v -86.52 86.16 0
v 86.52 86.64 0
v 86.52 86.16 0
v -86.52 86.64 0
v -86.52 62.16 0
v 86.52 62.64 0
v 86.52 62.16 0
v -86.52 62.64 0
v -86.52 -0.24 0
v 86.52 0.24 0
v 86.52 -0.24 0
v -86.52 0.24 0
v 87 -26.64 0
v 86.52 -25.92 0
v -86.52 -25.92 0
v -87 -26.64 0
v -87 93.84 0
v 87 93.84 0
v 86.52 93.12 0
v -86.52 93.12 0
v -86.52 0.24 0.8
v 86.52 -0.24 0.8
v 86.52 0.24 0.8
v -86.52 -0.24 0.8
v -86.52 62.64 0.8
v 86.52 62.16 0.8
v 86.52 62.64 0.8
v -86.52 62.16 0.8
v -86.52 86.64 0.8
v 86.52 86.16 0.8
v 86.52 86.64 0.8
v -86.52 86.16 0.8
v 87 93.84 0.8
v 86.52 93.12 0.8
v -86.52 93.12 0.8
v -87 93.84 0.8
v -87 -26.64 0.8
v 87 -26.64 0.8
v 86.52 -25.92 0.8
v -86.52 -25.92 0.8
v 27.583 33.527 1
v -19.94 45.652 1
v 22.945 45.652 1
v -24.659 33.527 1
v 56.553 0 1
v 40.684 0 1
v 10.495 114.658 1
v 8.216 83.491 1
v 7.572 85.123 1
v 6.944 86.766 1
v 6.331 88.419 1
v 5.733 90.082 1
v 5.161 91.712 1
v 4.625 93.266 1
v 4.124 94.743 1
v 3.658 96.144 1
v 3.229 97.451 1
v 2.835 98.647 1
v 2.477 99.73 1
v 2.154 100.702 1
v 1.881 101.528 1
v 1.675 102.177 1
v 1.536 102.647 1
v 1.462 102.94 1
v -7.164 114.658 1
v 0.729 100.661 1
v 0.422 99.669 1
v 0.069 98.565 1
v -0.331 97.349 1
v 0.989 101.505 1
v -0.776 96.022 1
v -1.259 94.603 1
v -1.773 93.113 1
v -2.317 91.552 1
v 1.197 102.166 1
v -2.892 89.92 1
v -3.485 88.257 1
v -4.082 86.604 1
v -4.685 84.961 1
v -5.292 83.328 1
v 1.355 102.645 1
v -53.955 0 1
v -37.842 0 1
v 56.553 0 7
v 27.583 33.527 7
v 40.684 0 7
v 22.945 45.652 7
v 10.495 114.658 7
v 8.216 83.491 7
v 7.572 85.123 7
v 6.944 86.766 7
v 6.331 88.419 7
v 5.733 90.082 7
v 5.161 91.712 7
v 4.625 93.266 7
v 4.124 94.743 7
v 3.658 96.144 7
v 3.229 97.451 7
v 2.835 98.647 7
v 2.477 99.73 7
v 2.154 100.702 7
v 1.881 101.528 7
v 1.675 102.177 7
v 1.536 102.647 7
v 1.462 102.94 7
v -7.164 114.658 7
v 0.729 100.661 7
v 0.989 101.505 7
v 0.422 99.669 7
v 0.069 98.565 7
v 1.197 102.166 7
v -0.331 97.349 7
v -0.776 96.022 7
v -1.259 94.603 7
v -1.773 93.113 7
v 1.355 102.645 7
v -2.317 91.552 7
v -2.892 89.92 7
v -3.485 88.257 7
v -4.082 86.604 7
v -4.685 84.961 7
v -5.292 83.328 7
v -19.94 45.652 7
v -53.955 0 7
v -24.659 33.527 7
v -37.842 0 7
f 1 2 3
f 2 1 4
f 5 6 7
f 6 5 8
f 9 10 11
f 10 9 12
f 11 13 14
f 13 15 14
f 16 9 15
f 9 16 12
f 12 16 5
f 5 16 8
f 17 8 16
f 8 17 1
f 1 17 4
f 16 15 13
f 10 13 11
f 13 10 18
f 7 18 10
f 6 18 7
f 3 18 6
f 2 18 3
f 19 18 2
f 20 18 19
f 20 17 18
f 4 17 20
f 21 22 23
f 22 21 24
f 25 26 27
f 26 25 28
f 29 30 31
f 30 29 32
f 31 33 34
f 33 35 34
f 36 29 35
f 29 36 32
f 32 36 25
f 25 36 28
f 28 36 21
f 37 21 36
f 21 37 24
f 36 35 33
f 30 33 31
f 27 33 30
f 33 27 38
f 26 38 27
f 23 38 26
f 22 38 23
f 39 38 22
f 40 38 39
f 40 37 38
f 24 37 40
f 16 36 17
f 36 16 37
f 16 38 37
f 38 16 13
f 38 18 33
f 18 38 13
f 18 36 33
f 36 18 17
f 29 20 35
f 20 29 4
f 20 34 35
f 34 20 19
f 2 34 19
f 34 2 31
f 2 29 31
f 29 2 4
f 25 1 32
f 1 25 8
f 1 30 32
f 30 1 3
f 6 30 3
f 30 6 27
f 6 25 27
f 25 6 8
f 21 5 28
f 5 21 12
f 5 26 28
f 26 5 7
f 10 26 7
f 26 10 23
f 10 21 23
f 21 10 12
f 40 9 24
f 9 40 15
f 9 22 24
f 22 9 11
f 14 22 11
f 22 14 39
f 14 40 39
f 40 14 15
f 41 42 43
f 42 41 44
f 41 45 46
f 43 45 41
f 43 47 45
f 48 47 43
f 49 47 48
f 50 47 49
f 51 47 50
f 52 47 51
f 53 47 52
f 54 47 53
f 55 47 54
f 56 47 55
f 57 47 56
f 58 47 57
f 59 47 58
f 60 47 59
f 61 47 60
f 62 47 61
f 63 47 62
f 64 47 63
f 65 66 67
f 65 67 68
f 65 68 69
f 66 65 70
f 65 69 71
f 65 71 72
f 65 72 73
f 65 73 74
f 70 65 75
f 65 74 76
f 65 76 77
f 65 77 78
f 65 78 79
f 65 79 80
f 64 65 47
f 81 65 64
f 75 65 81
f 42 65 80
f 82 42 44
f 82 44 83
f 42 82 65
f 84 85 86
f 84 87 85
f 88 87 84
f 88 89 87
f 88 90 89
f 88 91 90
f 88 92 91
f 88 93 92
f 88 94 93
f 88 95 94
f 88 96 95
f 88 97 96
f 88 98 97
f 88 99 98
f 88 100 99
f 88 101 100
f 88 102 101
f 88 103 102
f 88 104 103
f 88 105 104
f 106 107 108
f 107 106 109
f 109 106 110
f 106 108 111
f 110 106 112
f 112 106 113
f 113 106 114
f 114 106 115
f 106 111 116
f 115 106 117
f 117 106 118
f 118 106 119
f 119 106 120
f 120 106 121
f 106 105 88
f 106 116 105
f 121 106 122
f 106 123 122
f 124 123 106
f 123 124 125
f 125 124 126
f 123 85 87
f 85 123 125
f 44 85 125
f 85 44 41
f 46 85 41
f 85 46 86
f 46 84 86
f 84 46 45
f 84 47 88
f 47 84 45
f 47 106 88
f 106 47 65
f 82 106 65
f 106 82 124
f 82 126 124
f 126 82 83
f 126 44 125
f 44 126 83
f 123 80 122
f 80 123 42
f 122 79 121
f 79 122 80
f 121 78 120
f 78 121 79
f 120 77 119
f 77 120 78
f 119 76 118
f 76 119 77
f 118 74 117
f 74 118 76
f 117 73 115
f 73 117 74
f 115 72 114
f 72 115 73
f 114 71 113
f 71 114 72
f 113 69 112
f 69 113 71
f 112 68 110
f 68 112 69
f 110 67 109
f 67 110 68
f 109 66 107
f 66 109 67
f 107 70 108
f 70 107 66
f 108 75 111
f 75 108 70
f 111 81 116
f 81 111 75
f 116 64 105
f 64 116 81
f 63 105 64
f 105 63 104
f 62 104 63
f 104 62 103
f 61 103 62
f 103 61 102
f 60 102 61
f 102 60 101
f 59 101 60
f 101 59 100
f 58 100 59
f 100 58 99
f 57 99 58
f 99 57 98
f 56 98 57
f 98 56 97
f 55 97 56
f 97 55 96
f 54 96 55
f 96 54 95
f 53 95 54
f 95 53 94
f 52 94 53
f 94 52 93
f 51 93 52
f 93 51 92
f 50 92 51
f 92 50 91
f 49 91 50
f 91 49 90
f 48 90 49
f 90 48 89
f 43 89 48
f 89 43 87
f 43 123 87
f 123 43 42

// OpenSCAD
// file: geometry/contact_sheet.scad
//////////////////////////////////////////////////////////////////////
// LibFile: contact_sheet.scad
// Project: Glyph Dossier
// FileGroup: Diagnostic Rendering
// FileSummary: Representative-set preview grid.
//////////////////////////////////////////////////////////////////////

module _contact_cell_frame(cell_size, depth) {
    frame_thickness = 0.8;

    color([0.35, 0.40, 0.48, 0.35])
        linear_extrude(height = depth)
            difference() {
                square(
                    [cell_size, cell_size],
                    center = true
                );
                square(
                    [
                        cell_size - 2 * frame_thickness,
                        cell_size - 2 * frame_thickness
                    ],
                    center = true
                );
            }
}

module glyph_contact_sheet(
    ids,
    records,
    source_kind,
    font_name,
    columns,
    cell_size,
    glyph_size,
    depth
) {
    rows = ceil(len(ids) / columns);

    for (index = [0 : len(ids) - 1]) {
        row = floor(index / columns);
        column = index % columns;
        x = (column - (columns - 1) / 2) * cell_size;
        y = ((rows - 1) / 2 - row) * cell_size;
        dossier = named_record(
            records,
            ids[index],
            "contact-sheet dossier"
        );

        translate([x, y, 0]) {
            _contact_cell_frame(cell_size, 0.6);

            color([0.88, 0.68, 0.24])
                translate([0, -glyph_size * 0.25, 0.8])
                    glyph_profile_3d(
                        dossier,
                        source_kind,
                        font_name,
                        glyph_size,
                        depth
                    );
        }
    }
}
// file: geometry/dossier_scene.scad
//////////////////////////////////////////////////////////////////////
// LibFile: dossier_scene.scad
// Project: Glyph Dossier
// FileGroup: Diagnostic Rendering
// FileSummary: Individual profile and guide-frame render modes.
//////////////////////////////////////////////////////////////////////

module render_glyph_dossier(
    dossier,
    render_mode,
    source_kind,
    font_name,
    nominal_size,
    extrusion_depth,
    guide_depth,
    show_guides,
    show_frame,
    x_height_ratio,
    cap_height_ratio,
    ascender_ratio,
    descender_ratio
) {
    if (render_mode == "profile_2d") {
        glyph_source_2d(
            dossier,
            source_kind,
            font_name,
            nominal_size
        );
    } else if (render_mode == "profile_3d") {
        glyph_profile_3d(
            dossier,
            source_kind,
            font_name,
            nominal_size,
            extrusion_depth
        );
    } else if (render_mode == "dossier") {
        if (show_guides)
            color([0.45, 0.55, 0.70, 0.45])
                nominal_guides_3d(
                    nominal_size,
                    guide_depth,
                    x_height_ratio,
                    cap_height_ratio,
                    ascender_ratio,
                    descender_ratio,
                    show_frame
                );

        color([0.88, 0.68, 0.24])
            translate([0, 0, guide_depth + 0.2])
                glyph_profile_3d(
                    dossier,
                    source_kind,
                    font_name,
                    nominal_size,
                    extrusion_depth
                );
    }
}
// file: geometry/analysis_guides.scad
//////////////////////////////////////////////////////////////////////
// LibFile: analysis_guides.scad
// Project: Glyph Dossier
// FileGroup: Diagnostic Geometry
// FileSummary: Nominal, non-measured baseline and height guides.
//////////////////////////////////////////////////////////////////////

module _guide_line_2d(width, thickness, y) {
    translate([0, y])
        square([width, thickness], center = true);
}

module nominal_guides_2d(
    nominal_size,
    x_height_ratio,
    cap_height_ratio,
    ascender_ratio,
    descender_ratio,
    show_frame = true
) {
    guide_width = nominal_size * 1.45;
    thickness = max(0.35, nominal_size * 0.004);
    lower = -nominal_size * descender_ratio;
    upper = nominal_size * ascender_ratio;

    union() {
        _guide_line_2d(guide_width, thickness, 0);
        _guide_line_2d(
            guide_width,
            thickness,
            nominal_size * x_height_ratio
        );
        _guide_line_2d(
            guide_width,
            thickness,
            nominal_size * cap_height_ratio
        );
        _guide_line_2d(guide_width, thickness, upper);
        _guide_line_2d(guide_width, thickness, lower);

        if (show_frame)
            difference() {
                translate([0, (upper + lower) / 2])
                    square(
                        [guide_width, upper - lower],
                        center = true
                    );
                translate([0, (upper + lower) / 2])
                    square(
                        [
                            guide_width - 2 * thickness,
                            upper - lower - 2 * thickness
                        ],
                        center = true
                    );
            }
    }
}

module nominal_guides_3d(
    nominal_size,
    depth,
    x_height_ratio,
    cap_height_ratio,
    ascender_ratio,
    descender_ratio,
    show_frame = true
) {
    linear_extrude(height = depth)
        nominal_guides_2d(
            nominal_size,
            x_height_ratio,
            cap_height_ratio,
            ascender_ratio,
            descender_ratio,
            show_frame
        );
}
// file: geometry/glyph_profile.scad
//////////////////////////////////////////////////////////////////////
// LibFile: glyph_profile.scad
// Project: Glyph Dossier
// FileGroup: Source Adapter
// FileSummary: Font-backed text, glyph, source, and extrusion adapters.
//////////////////////////////////////////////////////////////////////

module font_text_2d(
    value,
    font_name,
    nominal_size,
    halign_value = "center",
    valign_value = "baseline"
) {
    if (font_name == "")
        text(
            text = value,
            size = nominal_size,
            halign = halign_value,
            valign = valign_value
        );
    else
        text(
            text = value,
            size = nominal_size,
            font = font_name,
            halign = halign_value,
            valign = valign_value
        );
}

module font_glyph_2d(glyph, font_name, nominal_size) {
    font_text_2d(
        glyph,
        font_name,
        nominal_size,
        "center",
        "baseline"
    );
}

module glyph_source_2d(
    dossier,
    source_kind,
    font_name,
    nominal_size
) {
    assert(
        source_kind == "font",
        str("Source adapter does not implement kind: ", source_kind)
    );

    font_glyph_2d(
        dossier[GD_GLYPH],
        font_name,
        nominal_size
    );
}

module glyph_profile_3d(
    dossier,
    source_kind,
    font_name,
    nominal_size,
    depth
) {
    linear_extrude(height = depth)
        glyph_source_2d(
            dossier,
            source_kind,
            font_name,
            nominal_size
        );
}

module glyph_source_record_2d(
    dossier,
    source,
    nominal_size
) {
    glyph_source_2d(
        dossier,
        source[FS_KIND],
        source[FS_FONT_NAME],
        nominal_size
    );
}

module glyph_source_record_3d(
    dossier,
    source,
    nominal_size,
    depth
) {
    glyph_profile_3d(
        dossier,
        source[FS_KIND],
        source[FS_FONT_NAME],
        nominal_size,
        depth
    );
}
// file: lib/reporting.scad
//////////////////////////////////////////////////////////////////////
// LibFile: reporting.scad
// Project: Glyph Dossier
// FileGroup: Console Reporting
// FileSummary: Reports project, source, dossier, and study-set data.
//////////////////////////////////////////////////////////////////////

module report_project(project, report_level = "full") {
    echo("GLYPH_DOSSIER_PROJECT", project[PR_NAME]);
    echo("GLYPH_DOSSIER_KIND", project[PR_KIND]);
    echo("GLYPH_DOSSIER_EDITION", project[PR_EDITION]);
    echo("GLYPH_DOSSIER_BASELINE", project[PR_BASELINE]);

    if (report_level == "full") {
        echo("GLYPH_DOSSIER_SCOPE", project[PR_SCOPE]);
        echo("GLYPH_DOSSIER_STATUS", project[PR_STATUS]);
    }
}

module report_catalog_notice(project) {
    echo("GLYPH_DOSSIER_CATALOG", project[PR_STATUS]);
}

module report_source(
    source_kind,
    font_name,
    font_license,
    font_source_url,
    font_revision
) {
    echo("GLYPH_SOURCE_KIND", source_kind);
    echo(
        "GLYPH_FONT_NAME",
        font_name == "" ? "OpenSCAD default font" : font_name
    );
    echo("GLYPH_FONT_LICENSE", font_license);
    echo("GLYPH_FONT_SOURCE_URL", font_source_url);
    echo("GLYPH_FONT_REVISION", font_revision);
}

module report_glyph_dossier(dossier, report_level = "full") {
    echo("DOSSIER_ID", dossier[GD_ID]);
    echo("DOSSIER_GLYPH", dossier[GD_GLYPH]);
    echo("DOSSIER_GROUP", dossier[GD_GROUP]);
    echo("DOSSIER_ARCHETYPE", dossier[GD_ARCHETYPE]);
    echo("DOSSIER_COMPONENT_RANGE", [
        dossier[GD_COMPONENTS_MIN],
        dossier[GD_COMPONENTS_MAX]
    ]);
    echo("DOSSIER_COUNTER_RANGE", [
        dossier[GD_COUNTERS_MIN],
        dossier[GD_COUNTERS_MAX]
    ]);
    echo("DOSSIER_VERTICAL_CLASS", dossier[GD_VERTICAL_CLASS]);
    echo("DOSSIER_PRIORITY", dossier[GD_PRIORITY]);

    if (report_level == "full") {
        echo("DOSSIER_FEATURES", dossier[GD_FEATURES]);
        echo("DOSSIER_SECTION_RISKS", dossier[GD_RISKS]);
        echo("DOSSIER_FONT_VARIANTS", dossier[GD_VARIANTS]);
        echo("DOSSIER_NOTE", dossier[GD_NOTE]);
    }
}

module report_study_set(set_name, ids) {
    echo("STUDY_SET_NAME", set_name);
    echo("STUDY_SET_COUNT", len(ids));
    echo("STUDY_SET_IDS", ids);
}
// file: lib/lookup.scad
//////////////////////////////////////////////////////////////////////
// LibFile: lookup.scad
// Project: Glyph Dossier
// FileGroup: Exact Lookup
// FileSummary: Requires exactly one matching named record.
//////////////////////////////////////////////////////////////////////

function named_matches(records, name) = [
    for (record = records)
        if (record_name(record) == name)
            record
];

function named_record(records, name, record_kind = "record") =
    let(matches = named_matches(records, name))
    assert(
        len(matches) == 1,
        str(
            "Expected exactly one ",
            record_kind,
            " named ",
            name,
            "; found ",
            len(matches)
        )
    )
    matches[0];

function exact_name_count(records, name) =
    len(named_matches(records, name));
// file: config/workbenches.scad
//////////////////////////////////////////////////////////////////////
// LibFile: workbenches.scad
// Project: Glyph Dossier
// FileGroup: Workbench Contracts
// FileSummary: Declares supported workbenches and render modes.
//////////////////////////////////////////////////////////////////////

VALID_WORKBENCHES = [
    "development",
    "laboratory",
    "profile",
    "contact_sheet",
    "catalog"
];

VALID_RENDER_MODES = [
    "dossier",
    "profile_2d",
    "profile_3d",
    "contact_sheet",
    "report_only"
];

VALID_SOURCE_KINDS = [
    "font"
];

function value_in_list(values, value) =
    len([for (candidate = values) if (candidate == value) candidate]) > 0;

module validate_workbench_selection(
    workbench_name,
    render_mode,
    source_kind
) {
    assert(
        value_in_list(VALID_WORKBENCHES, workbench_name),
        str("Unknown workbench: ", workbench_name)
    );
    assert(
        value_in_list(VALID_RENDER_MODES, render_mode),
        str("Unknown render mode: ", render_mode)
    );
    assert(
        value_in_list(VALID_SOURCE_KINDS, source_kind),
        str("Unsupported Batch 001 source kind: ", source_kind)
    );
}
// file: config/glyphs.scad
//////////////////////////////////////////////////////////////////////
// LibFile: glyphs.scad
// Project: Glyph Dossier
// FileGroup: Registry Composition
// FileSummary: Exposes the complete character-analysis registry.
//////////////////////////////////////////////////////////////////////

ALL_GLYPHS = concat(
    UPPERCASE_GLYPHS,
    LOWERCASE_GLYPHS,
    DIGIT_GLYPHS,
    PUNCTUATION_GLYPHS
);
// file: registries/study_sets.scad
//////////////////////////////////////////////////////////////////////
// LibFile: study_sets.scad
// Project: Glyph Dossier
// FileGroup: Study Registry
// FileSummary: Representative character sets for focused analysis.
//////////////////////////////////////////////////////////////////////

REPRESENTATIVE_SET_IDS = [
    "U_A",
    "U_B",
    "U_O",
    "U_S",
    "U_Z",
    "L_a",
    "L_g",
    "L_i",
    "L_j",
    "L_m",
    "L_s",
    "D_0",
    "D_1",
    "D_2",
    "D_4",
    "D_8",
    "P_question",
    "P_exclamation",
    "P_colon",
    "P_semicolon"
];
// file: registries/punctuation.scad
//////////////////////////////////////////////////////////////////////
// LibFile: punctuation_glyphs.scad
// Project: Glyph Dossier
// FileGroup: Character Registry
// FileSummary: Character-level dossiers for question, exclamation, colon, and semicolon.
//////////////////////////////////////////////////////////////////////

PUNCTUATION_GLYPHS = [
    glyph_dossier(
        "P_question",
        "?",
        "punctuation",
        "curved_mark_dot",
        2,
        2,
        0,
        0,
        "cap_punctuation",
        ["upper_curve", "narrow_transition", "terminal", "separate_dot"],
        ["dot_loss", "component_assignment", "curve_cut", "narrow_transition"],
        ["curve_shape", "dot_shape", "terminal_angle"],
        "primary",
        "Primary punctuation test combining a complex main mark and separate dot."
    ),
    glyph_dossier(
        "P_exclamation",
        "!",
        "punctuation",
        "stem_dot",
        2,
        2,
        0,
        0,
        "cap_punctuation",
        ["main_stem", "separate_dot"],
        ["dot_loss", "stem_fragment", "component_assignment"],
        ["tapered_stem", "rectangular_stem", "dot_shape"],
        "primary",
        "Primary two-component punctuation control glyph."
    ),
    glyph_dossier(
        "P_colon",
        ":",
        "punctuation",
        "paired_dots",
        2,
        2,
        0,
        0,
        "x_punctuation",
        ["upper_dot", "lower_dot"],
        ["component_loss", "component_assignment", "small_part"],
        ["round_dots", "square_dots"],
        "primary",
        "Primary test consisting entirely of disconnected small components."
    ),
    glyph_dossier(
        "P_semicolon",
        ";",
        "punctuation",
        "dot_descending_mark",
        2,
        2,
        0,
        0,
        "descender_punctuation",
        ["upper_dot", "lower_comma_tail"],
        ["component_loss", "tail_fragment", "component_assignment"],
        ["tail_angle", "dot_shape"],
        "primary",
        "Tests disconnected punctuation with a descending curved component."
    )
];
// file: registries/digits.scad
//////////////////////////////////////////////////////////////////////
// LibFile: digit_glyphs.scad
// Project: Glyph Dossier
// FileGroup: Character Registry
// FileSummary: Character-level dossiers for digits 0 through 9.
//////////////////////////////////////////////////////////////////////

DIGIT_GLYPHS = [
    glyph_dossier(
        "D_0",
        "0",
        "digit",
        "closed_ring",
        1,
        1,
        1,
        1,
        "digit_height",
        ["outer_curve", "counter", "continuous_ring"],
        ["counter_collapse", "ring_thickness_loss", "letter_confusion"],
        ["slashed_zero", "dotted_zero", "oval_width"],
        "primary",
        "Primary digit ring test and distinction from uppercase O."
    ),
    glyph_dossier(
        "D_1",
        "1",
        "digit",
        "stem_flag_base",
        1,
        1,
        0,
        0,
        "digit_height",
        ["main_stem", "possible_flag", "possible_base"],
        ["narrow_part", "flag_fragment", "base_fragment"],
        ["plain_stem", "top_flag", "bottom_base", "serifed"],
        "primary",
        "Primary font-variation and narrow-digit test."
    ),
    glyph_dossier(
        "D_2",
        "2",
        "digit",
        "curve_diagonal_base",
        1,
        1,
        0,
        0,
        "digit_height",
        ["upper_curve", "diagonal_transition", "bottom_bar"],
        ["curve_diagonal_cut", "bottom_bar_fragment", "thin_transition"],
        ["flat_or_curved_base", "diagonal_angle"],
        "primary",
        "Primary mixed curve, diagonal, and horizontal test."
    ),
    glyph_dossier(
        "D_3",
        "3",
        "digit",
        "double_open_bowl",
        1,
        1,
        0,
        0,
        "digit_height",
        ["upper_curve", "lower_curve", "central_waist"],
        ["waist_fragment", "curve_cut", "terminal_fragment"],
        ["upper_lower_balance", "flat_or_rounded_spine"],
        "coverage",
        "Tests two open curved lobes and a narrow waist."
    ),
    glyph_dossier(
        "D_4",
        "4",
        "digit",
        "crossbar_diagonal_stem",
        1,
        1,
        0,
        1,
        "digit_height",
        ["diagonal", "vertical_stem", "crossbar", "possible_counter"],
        ["form_substitution", "crossbar_cut", "counter_collapse", "junction_cut"],
        ["open_four", "closed_four", "crossbar_height"],
        "primary",
        "Primary digit form-variation and junction test."
    ),
    glyph_dossier(
        "D_5",
        "5",
        "digit",
        "top_stem_lower_curve",
        1,
        1,
        0,
        0,
        "digit_height",
        ["top_bar", "upper_stem", "lower_curve"],
        ["curve_stem_cut", "top_bar_fragment", "waist_fragment"],
        ["flat_or_curved_top", "lower_bowl_size"],
        "coverage",
        "Tests abrupt transition from rectilinear to curved geometry."
    ),
    glyph_dossier(
        "D_6",
        "6",
        "digit",
        "loop_open_tail",
        1,
        1,
        1,
        1,
        "digit_height",
        ["lower_loop", "counter", "upper_open_curve"],
        ["counter_collapse", "neck_cut", "terminal_fragment"],
        ["loop_size", "terminal_angle"],
        "coverage",
        "Tests one counter with an open upper continuation."
    ),
    glyph_dossier(
        "D_7",
        "7",
        "digit",
        "topbar_diagonal",
        1,
        1,
        0,
        0,
        "digit_height",
        ["top_bar", "long_diagonal", "possible_crossbar"],
        ["diagonal_cut", "top_bar_fragment", "crossbar_fragment"],
        ["crossed_seven", "plain_seven", "serifed"],
        "coverage",
        "Tests a long diagonal and optional crossbar."
    ),
    glyph_dossier(
        "D_8",
        "8",
        "digit",
        "double_closed_loop",
        1,
        1,
        2,
        2,
        "digit_height",
        ["upper_loop", "lower_loop", "two_counters", "central_waist"],
        ["counter_collapse", "waist_fragment", "loop_boundary_cut"],
        ["upper_lower_balance", "waist_width"],
        "primary",
        "Primary two-counter digit test."
    ),
    glyph_dossier(
        "D_9",
        "9",
        "digit",
        "loop_descending_tail",
        1,
        1,
        1,
        1,
        "digit_height",
        ["upper_loop", "counter", "lower_open_tail"],
        ["counter_collapse", "neck_cut", "tail_fragment"],
        ["loop_size", "tail_angle"],
        "coverage",
        "Tests one upper counter with a descending open continuation."
    )
];
// file: config/projects.scad
//////////////////////////////////////////////////////////////////////
// LibFile: projects.scad
// Project: Glyph Dossier
// FileGroup: Registry Routing
// FileSummary: Exposes the active project registry.
//////////////////////////////////////////////////////////////////////

PROJECTS = wb_workbench_name == "catalog"
    ? CATALOG_PROJECTS
    : LABORATORY_PROJECTS;
// file: registries/catalog_projects.scad
//////////////////////////////////////////////////////////////////////
// LibFile: catalog_projects.scad
// Project: Glyph Dossier
// FileGroup: Read-Only Registry
// FileSummary: Physical object catalog remains empty.
//////////////////////////////////////////////////////////////////////

CATALOG_PROJECTS = [
    glyph_project(
        "NO_ACCEPTED_GLYPH_OBJECTS",
        "catalog_notice",
        "0.11.0",
        "Physically accepted source-specific glyph objects.",
        "commit-c58e767-batch-011",
        "No accepted physical glyph objects."
    )
];
// file: registries/laboratory_projects.scad
//////////////////////////////////////////////////////////////////////
// LibFile: laboratory_projects.scad
// Project: Glyph Dossier
// FileGroup: Mutable Registry
// FileSummary: Complete portable source package and U_A laboratory.
//////////////////////////////////////////////////////////////////////

LABORATORY_PROJECTS = [
    glyph_project(
        "GLYPH_DOSSIER_LAB",
        "laboratory",
        "0.7.0",
        "Complete 66-glyph portable source package and exact-height portable U_A sectioning.",
        "commit-81d9559-batch-007",
        "Liberation Sans R1 covers every dossier; no physical objects accepted."
    )
];
// file: lib/schema.scad
//////////////////////////////////////////////////////////////////////
// LibFile: schema.scad
// Project: Glyph Dossier
// FileGroup: Record Schema
// FileSummary: Project, glyph, source, and observation records.
//////////////////////////////////////////////////////////////////////

PR_NAME = 0;
PR_KIND = 1;
PR_EDITION = 2;
PR_SCOPE = 3;
PR_BASELINE = 4;
PR_STATUS = 5;

function glyph_project(
    name,
    kind,
    edition,
    scope,
    baseline,
    status
) = [
    name,
    kind,
    edition,
    scope,
    baseline,
    status
];

GD_ID = 0;
GD_GLYPH = 1;
GD_GROUP = 2;
GD_ARCHETYPE = 3;
GD_COMPONENTS_MIN = 4;
GD_COMPONENTS_MAX = 5;
GD_COUNTERS_MIN = 6;
GD_COUNTERS_MAX = 7;
GD_VERTICAL_CLASS = 8;
GD_FEATURES = 9;
GD_RISKS = 10;
GD_VARIANTS = 11;
GD_PRIORITY = 12;
GD_NOTE = 13;

function glyph_dossier(
    id,
    glyph,
    group,
    archetype,
    components_min,
    components_max,
    counters_min,
    counters_max,
    vertical_class,
    features,
    risks,
    variants,
    priority,
    note
) = [
    id,
    glyph,
    group,
    archetype,
    components_min,
    components_max,
    counters_min,
    counters_max,
    vertical_class,
    features,
    risks,
    variants,
    priority,
    note
];

FS_ID = 0;
FS_KIND = 1;
FS_LABEL = 2;
FS_FONT_NAME = 3;
FS_LICENSE = 4;
FS_URL = 5;
FS_REVISION = 6;
FS_STATUS = 7;

function font_source(
    id,
    kind,
    label,
    font_name,
    license_name,
    source_url,
    revision,
    status
) = [
    id,
    kind,
    label,
    font_name,
    license_name,
    source_url,
    revision,
    status
];

OBS_UNKNOWN = -999999;

OB_ID = 0;
OB_SOURCE_ID = 1;
OB_GLYPH_ID = 2;
OB_STATUS = 3;
OB_VARIANT = 4;
OB_COMPONENTS = 5;
OB_COUNTERS = 6;
OB_LEFT = 7;
OB_RIGHT = 8;
OB_BOTTOM = 9;
OB_TOP = 10;
OB_MIN_STROKE = 11;
OB_MIN_GAP = 12;
OB_NOTE = 13;

function glyph_observation(
    id,
    source_id,
    glyph_id,
    status,
    variant,
    components,
    counters,
    left_extent,
    right_extent,
    bottom_extent,
    top_extent,
    minimum_stroke,
    minimum_gap,
    note
) = [
    id,
    source_id,
    glyph_id,
    status,
    variant,
    components,
    counters,
    left_extent,
    right_extent,
    bottom_extent,
    top_extent,
    minimum_stroke,
    minimum_gap,
    note
];

function observation_value_known(value) =
    value != OBS_UNKNOWN;

function observation_has_bounds(observation) =
    observation_value_known(observation[OB_LEFT])
    && observation_value_known(observation[OB_RIGHT])
    && observation_value_known(observation[OB_BOTTOM])
    && observation_value_known(observation[OB_TOP]);

function observation_width(observation) =
    observation_has_bounds(observation)
    ? observation[OB_RIGHT] - observation[OB_LEFT]
    : OBS_UNKNOWN;

function observation_height(observation) =
    observation_has_bounds(observation)
    ? observation[OB_TOP] - observation[OB_BOTTOM]
    : OBS_UNKNOWN;

function record_name(record) = record[0];
// file: config/defaults.scad
//////////////////////////////////////////////////////////////////////
// LibFile: defaults.scad
// Project: Glyph Dossier
// FileGroup: Workbench Configuration
// FileSummary: Resolves wrapper inputs into stable wb_* values.
//////////////////////////////////////////////////////////////////////

wb_workbench_name = is_undef(workbench_name)
    ? "development" : workbench_name;
wb_project_name = is_undef(project_name_selected)
    ? "GLYPH_DOSSIER_LAB" : project_name_selected;
wb_glyph_id = is_undef(glyph_id_selected)
    ? "U_A" : glyph_id_selected;
wb_source_id = is_undef(source_id_selected)
    ? "SRC_1" : source_id_selected;
wb_render_mode = is_undef(render_mode)
    ? "dossier" : render_mode;
wb_report_level = is_undef(report_level)
    ? "full" : report_level;

legacy_font_name = is_undef(font_name) ? "" : font_name;
legacy_font_license = is_undef(font_license)
    ? "unrecorded" : font_license;
legacy_font_url = is_undef(font_source_url)
    ? "" : font_source_url;
legacy_font_revision = is_undef(font_revision)
    ? "" : font_revision;

wb_source_kind = is_undef(source_kind)
    ? "font" : source_kind;

wb_source_1_label = is_undef(source_1_label)
    ? "Source 1" : source_1_label;
wb_source_1_font_name = is_undef(source_1_font_name)
    ? legacy_font_name : source_1_font_name;
wb_source_1_license = is_undef(source_1_license)
    ? legacy_font_license : source_1_license;
wb_source_1_url = is_undef(source_1_url)
    ? legacy_font_url : source_1_url;
wb_source_1_revision = is_undef(source_1_revision)
    ? legacy_font_revision : source_1_revision;

wb_source_2_label = is_undef(source_2_label)
    ? "Source 2" : source_2_label;
wb_source_2_font_name = is_undef(source_2_font_name)
    ? "" : source_2_font_name;
wb_source_2_license = is_undef(source_2_license)
    ? "unrecorded" : source_2_license;
wb_source_2_url = is_undef(source_2_url)
    ? "" : source_2_url;
wb_source_2_revision = is_undef(source_2_revision)
    ? "" : source_2_revision;

wb_source_3_label = is_undef(source_3_label)
    ? "Source 3" : source_3_label;
wb_source_3_font_name = is_undef(source_3_font_name)
    ? "" : source_3_font_name;
wb_source_3_license = is_undef(source_3_license)
    ? "unrecorded" : source_3_license;
wb_source_3_url = is_undef(source_3_url)
    ? "" : source_3_url;
wb_source_3_revision = is_undef(source_3_revision)
    ? "" : source_3_revision;

wb_compare_source_1_id = is_undef(compare_source_1_id)
    ? "SRC_1" : compare_source_1_id;
wb_compare_source_2_id = is_undef(compare_source_2_id)
    ? "SRC_2" : compare_source_2_id;
wb_compare_source_3_id = is_undef(compare_source_3_id)
    ? "SRC_3" : compare_source_3_id;

wb_observed_status = is_undef(observed_status)
    ? "pending" : observed_status;
wb_observed_variant = is_undef(observed_variant)
    ? "unobserved" : observed_variant;
wb_observed_components = is_undef(observed_components)
    ? -999999 : observed_components;
wb_observed_counters = is_undef(observed_counters)
    ? -999999 : observed_counters;
wb_observed_left_extent = is_undef(observed_left_extent)
    ? -999999 : observed_left_extent;
wb_observed_right_extent = is_undef(observed_right_extent)
    ? -999999 : observed_right_extent;
wb_observed_bottom_extent = is_undef(observed_bottom_extent)
    ? -999999 : observed_bottom_extent;
wb_observed_top_extent = is_undef(observed_top_extent)
    ? -999999 : observed_top_extent;
wb_observed_minimum_stroke = is_undef(observed_minimum_stroke)
    ? -999999 : observed_minimum_stroke;
wb_observed_minimum_gap = is_undef(observed_minimum_gap)
    ? -999999 : observed_minimum_gap;
wb_observation_note = is_undef(observation_note)
    ? "Awaiting source-specific inspection." : observation_note;

wb_stroke_probe_x = is_undef(stroke_probe_x)
    ? 0 : stroke_probe_x;
wb_stroke_probe_y = is_undef(stroke_probe_y)
    ? 45 : stroke_probe_y;
wb_stroke_probe_orientation = is_undef(stroke_probe_orientation)
    ? "vertical" : stroke_probe_orientation;
wb_stroke_probe_length = is_undef(stroke_probe_length)
    ? 30 : stroke_probe_length;

wb_gap_probe_x = is_undef(gap_probe_x)
    ? 0 : gap_probe_x;
wb_gap_probe_y = is_undef(gap_probe_y)
    ? 25 : gap_probe_y;
wb_gap_probe_orientation = is_undef(gap_probe_orientation)
    ? "horizontal" : gap_probe_orientation;
wb_gap_probe_length = is_undef(gap_probe_length)
    ? 30 : gap_probe_length;

wb_nominal_size = is_undef(nominal_size)
    ? 120 : nominal_size;
wb_extrusion_depth = is_undef(extrusion_depth)
    ? 6 : extrusion_depth;
wb_guide_depth = is_undef(guide_depth)
    ? 0.8 : guide_depth;
wb_show_guides = is_undef(show_guides)
    ? true : show_guides;
wb_show_frame = is_undef(show_frame)
    ? true : show_frame;
wb_show_manual_guides = is_undef(show_manual_guides)
    ? true : show_manual_guides;

wb_x_height_ratio = is_undef(x_height_ratio)
    ? 0.52 : x_height_ratio;
wb_cap_height_ratio = is_undef(cap_height_ratio)
    ? 0.72 : cap_height_ratio;
wb_ascender_ratio = is_undef(ascender_ratio)
    ? 0.78 : ascender_ratio;
wb_descender_ratio = is_undef(descender_ratio)
    ? 0.22 : descender_ratio;

wb_sheet_columns = is_undef(sheet_columns)
    ? 5 : sheet_columns;
wb_sheet_cell_size = is_undef(sheet_cell_size)
    ? 72 : sheet_cell_size;
wb_sheet_glyph_size = is_undef(sheet_glyph_size)
    ? 42 : sheet_glyph_size;
wb_sheet_depth = is_undef(sheet_depth)
    ? 2 : sheet_depth;

wb_source_sample_size = is_undef(source_sample_size)
    ? 42 : source_sample_size;
wb_source_sample_depth = is_undef(source_sample_depth)
    ? 2 : source_sample_depth;
wb_source_sample_line_gap = is_undef(source_sample_line_gap)
    ? 1.35 : source_sample_line_gap;
wb_comparison_spacing = is_undef(comparison_spacing)
    ? 170 : comparison_spacing;

// Batch 001 compatibility aliases.
wb_font_name = wb_source_1_font_name;
wb_font_license = wb_source_1_license;
wb_font_source_url = wb_source_1_url;
wb_font_revision = wb_source_1_revision;

// Batch 003 uppercase-A section experiment.
wb_section_origin_x = is_undef(section_origin_x)
    ? -300 : section_origin_x;
wb_section_origin_y = is_undef(section_origin_y)
    ? -20 : section_origin_y;
wb_section_cell_width = is_undef(section_cell_width)
    ? 200 : section_cell_width;
wb_section_cell_height = is_undef(section_cell_height)
    ? 200 : section_cell_height;
wb_section_columns = is_undef(section_columns)
    ? 3 : section_columns;
wb_section_rows = is_undef(section_rows)
    ? 3 : section_rows;
wb_selected_section_column = is_undef(selected_section_column)
    ? 0 : selected_section_column;
wb_selected_section_row = is_undef(selected_section_row)
    ? 0 : selected_section_row;
wb_section_epsilon = is_undef(section_epsilon)
    ? 0.05 : section_epsilon;
wb_layout_gap = is_undef(layout_gap)
    ? 20 : layout_gap;
wb_bed_x = is_undef(bed_x)
    ? 220 : bed_x;
wb_bed_y = is_undef(bed_y)
    ? 220 : bed_y;

wb_show_section_grid = is_undef(show_section_grid)
    ? true : show_section_grid;
wb_show_hazard_guides = is_undef(show_hazard_guides)
    ? true : show_hazard_guides;
wb_grid_line_width = is_undef(grid_line_width)
    ? 1.2 : grid_line_width;
wb_hazard_line_width = is_undef(hazard_line_width)
    ? 5 : hazard_line_width;

wb_a_apex_y_ratio = is_undef(a_apex_y_ratio)
    ? 0.72 : a_apex_y_ratio;
wb_a_counter_bottom_ratio = is_undef(a_counter_bottom_ratio)
    ? 0.22 : a_counter_bottom_ratio;
wb_a_counter_top_ratio = is_undef(a_counter_top_ratio)
    ? 0.55 : a_counter_top_ratio;
wb_a_crossbar_y_ratio = is_undef(a_crossbar_y_ratio)
    ? 0.34 : a_crossbar_y_ratio;
wb_a_counter_half_width_ratio = is_undef(a_counter_half_width_ratio)
    ? 0.17 : a_counter_half_width_ratio;
// main file
//////////////////////////////////////////////////////////////////////
// LibFile: main.scad
// Project: Glyph Dossier
// FileGroup: Shared Workbench Orchestrator
// FileSummary: Resolves, validates, reports, and dispatches analysis.
//////////////////////////////////////////////////////////////////////

include <config/defaults.scad>
include <lib/schema.scad>
include <registries/laboratory_projects.scad>
include <registries/catalog_projects.scad>
include <config/projects.scad>

include <registries/uppercase.scad>
include <registries/lowercase.scad>
include <registries/digits.scad>
include <registries/punctuation.scad>
include <registries/study_sets.scad>
include <config/glyphs.scad>

include <config/workbenches.scad>
include <lib/lookup.scad>
include <lib/validation.scad>
include <lib/reporting.scad>
include <geometry/glyph_profile.scad>
include <geometry/analysis_guides.scad>
include <geometry/dossier_scene.scad>
include <geometry/contact_sheet.scad>

module run_glyph_dossier() {
    validate_workbench_selection(
        wb_workbench_name,
        wb_render_mode,
        wb_source_kind
    );

    project = named_record(
        PROJECTS,
        wb_project_name,
        "Glyph Dossier project"
    );

    validate_project(project);
    validate_glyph_registry(ALL_GLYPHS);
    report_project(project, wb_report_level);
    report_source(
        wb_source_kind,
        wb_font_name,
        wb_font_license,
        wb_font_source_url,
        wb_font_revision
    );

    if (project[PR_KIND] == "catalog_notice") {
        report_catalog_notice(project);
    } else if (wb_render_mode == "contact_sheet") {
        validate_id_set(
            REPRESENTATIVE_SET_IDS,
            ALL_GLYPHS,
            "representative study set"
        );
        report_study_set(
            "REPRESENTATIVE_SET",
            REPRESENTATIVE_SET_IDS
        );
        glyph_contact_sheet(
            REPRESENTATIVE_SET_IDS,
            ALL_GLYPHS,
            wb_source_kind,
            wb_font_name,
            wb_sheet_columns,
            wb_sheet_cell_size,
            wb_sheet_glyph_size,
            wb_sheet_depth
        );
    } else {
        dossier = named_record(
            ALL_GLYPHS,
            wb_glyph_id,
            "glyph dossier"
        );

        validate_glyph_dossier(dossier);
        report_glyph_dossier(dossier, wb_report_level);

        if (wb_render_mode != "report_only")
            render_glyph_dossier(
                dossier,
                wb_render_mode,
                wb_source_kind,
                wb_font_name,
                wb_nominal_size,
                wb_extrusion_depth,
                wb_guide_depth,
                wb_show_guides,
                wb_show_frame,
                wb_x_height_ratio,
                wb_cap_height_ratio,
                wb_ascender_ratio,
                wb_descender_ratio
            );
    }
}

run_glyph_dossier();
